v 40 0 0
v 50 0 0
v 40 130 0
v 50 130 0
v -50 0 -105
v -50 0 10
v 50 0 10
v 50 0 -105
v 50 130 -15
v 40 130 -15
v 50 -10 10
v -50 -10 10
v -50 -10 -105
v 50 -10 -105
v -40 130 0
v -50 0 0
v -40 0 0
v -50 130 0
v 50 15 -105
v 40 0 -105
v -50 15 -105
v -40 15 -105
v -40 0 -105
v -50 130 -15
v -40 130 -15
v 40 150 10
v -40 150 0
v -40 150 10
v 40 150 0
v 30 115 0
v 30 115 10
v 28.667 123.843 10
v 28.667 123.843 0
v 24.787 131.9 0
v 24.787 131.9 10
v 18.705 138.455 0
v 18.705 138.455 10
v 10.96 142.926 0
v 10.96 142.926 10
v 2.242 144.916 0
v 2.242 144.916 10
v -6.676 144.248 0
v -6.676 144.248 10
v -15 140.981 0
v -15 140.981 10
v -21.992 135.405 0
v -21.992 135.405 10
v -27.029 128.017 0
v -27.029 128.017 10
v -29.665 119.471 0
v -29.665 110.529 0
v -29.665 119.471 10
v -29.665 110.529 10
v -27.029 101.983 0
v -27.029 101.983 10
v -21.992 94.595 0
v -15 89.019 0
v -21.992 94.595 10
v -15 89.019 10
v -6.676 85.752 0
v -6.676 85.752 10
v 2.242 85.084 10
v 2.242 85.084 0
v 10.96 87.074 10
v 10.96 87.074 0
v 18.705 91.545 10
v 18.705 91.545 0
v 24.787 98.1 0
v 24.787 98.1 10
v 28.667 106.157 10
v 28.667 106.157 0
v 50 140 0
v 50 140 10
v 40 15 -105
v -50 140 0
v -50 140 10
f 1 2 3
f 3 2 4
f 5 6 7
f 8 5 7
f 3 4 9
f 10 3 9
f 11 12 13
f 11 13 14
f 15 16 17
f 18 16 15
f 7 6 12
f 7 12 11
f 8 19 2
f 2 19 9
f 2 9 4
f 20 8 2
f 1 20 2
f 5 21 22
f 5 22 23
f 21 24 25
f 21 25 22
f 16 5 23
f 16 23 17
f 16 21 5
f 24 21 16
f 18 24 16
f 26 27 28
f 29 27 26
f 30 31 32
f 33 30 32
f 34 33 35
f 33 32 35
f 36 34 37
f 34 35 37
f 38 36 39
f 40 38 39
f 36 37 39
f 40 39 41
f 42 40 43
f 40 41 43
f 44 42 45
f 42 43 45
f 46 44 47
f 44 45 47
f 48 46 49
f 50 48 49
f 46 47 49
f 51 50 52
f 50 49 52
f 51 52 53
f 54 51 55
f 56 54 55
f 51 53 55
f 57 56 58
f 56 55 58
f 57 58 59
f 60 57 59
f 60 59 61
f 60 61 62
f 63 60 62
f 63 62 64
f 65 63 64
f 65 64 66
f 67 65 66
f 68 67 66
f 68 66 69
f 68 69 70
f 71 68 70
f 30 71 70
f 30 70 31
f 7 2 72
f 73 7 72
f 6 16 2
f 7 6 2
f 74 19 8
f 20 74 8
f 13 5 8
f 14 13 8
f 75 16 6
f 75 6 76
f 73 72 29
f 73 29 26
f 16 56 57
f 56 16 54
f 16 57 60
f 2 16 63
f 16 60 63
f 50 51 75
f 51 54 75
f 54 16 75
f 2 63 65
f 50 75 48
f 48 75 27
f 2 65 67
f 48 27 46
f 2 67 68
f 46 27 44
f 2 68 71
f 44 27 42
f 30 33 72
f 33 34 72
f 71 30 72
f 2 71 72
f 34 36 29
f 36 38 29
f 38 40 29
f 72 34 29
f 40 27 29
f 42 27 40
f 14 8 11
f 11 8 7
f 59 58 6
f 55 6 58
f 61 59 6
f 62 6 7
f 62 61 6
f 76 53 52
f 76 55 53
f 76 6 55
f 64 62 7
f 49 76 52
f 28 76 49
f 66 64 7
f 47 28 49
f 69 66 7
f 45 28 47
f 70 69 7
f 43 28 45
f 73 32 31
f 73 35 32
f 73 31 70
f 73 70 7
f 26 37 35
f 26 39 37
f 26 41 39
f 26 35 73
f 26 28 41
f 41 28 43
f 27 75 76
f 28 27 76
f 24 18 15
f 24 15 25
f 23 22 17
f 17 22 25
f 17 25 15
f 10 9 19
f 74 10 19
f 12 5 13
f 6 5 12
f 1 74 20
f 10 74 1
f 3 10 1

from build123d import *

# Parameters (mm, degrees)
SKETCH1_W           = 100
SKETCH1_H           = 150
BOSS_EXTRUDE1_DEPTH = 10
SKETCH3_W           = 100
SKETCH3_H           = 115
BOSS_EXTRUDE3_DEPTH = 10
BOSS_EXTRUDE4_DEPTH = 10
BOSS_EXTRUDE5_DEPTH = 10
CHAMFER1_SIZE       = 10
SKETCH6_R           = 30
CUT_EXTRUDE1_DEPTH  = 50


with BuildPart() as part:
    # Sketch1 → Boss-Extrude1 (new body)
    with BuildSketch(Plane.XY):
        with Locations((0, 75)):
            Rectangle(SKETCH1_W, SKETCH1_H)
    extrude(amount=BOSS_EXTRUDE1_DEPTH)

    # Chamfer1
    chamfer1_edges = [part.edges().sort_by_distance(p)[0] for p in [
        (-50, 150, 5),
        (50, 150, 5),
    ]]
    chamfer(chamfer1_edges, length=CHAMFER1_SIZE)

    # Sketch6 → Cut-Extrude1 (cut)
    with BuildSketch(Plane.XY.offset(10)):
        with Locations((0, 115)):
            Circle(SKETCH6_R)
    extrude(amount=-CUT_EXTRUDE1_DEPTH, mode=Mode.SUBTRACT)


with BuildPart() as body_2:
    # Sketch3 → Boss-Extrude3 (new body)
    with BuildSketch(Plane.XZ):
        with Locations((0, -47.5)):
            Rectangle(SKETCH3_W, SKETCH3_H)
    extrude(amount=BOSS_EXTRUDE3_DEPTH)


with BuildPart() as body_3:
    # Sketch4 → Boss-Extrude4 (new body)
    with BuildSketch(Plane(origin=(50, 0, 0), x_dir=(0, 0, -1), z_dir=(1, 0, 0))):
        Polygon((105, 0), (0, 0), (0, 130), (15, 130), (105, 15), align=None)
    extrude(amount=-BOSS_EXTRUDE4_DEPTH)


with BuildPart() as body_4:
    # Sketch5 → Boss-Extrude5 (new body)
    with BuildSketch(Plane.ZY.offset(50)):
        Polygon((0, 0), (0, 130), (-15, 130), (-105, 15), (-105, 0), align=None)
    extrude(amount=-BOSS_EXTRUDE5_DEPTH)


solid = Compound([part.part, body_2.part, body_3.part, body_4.part])
